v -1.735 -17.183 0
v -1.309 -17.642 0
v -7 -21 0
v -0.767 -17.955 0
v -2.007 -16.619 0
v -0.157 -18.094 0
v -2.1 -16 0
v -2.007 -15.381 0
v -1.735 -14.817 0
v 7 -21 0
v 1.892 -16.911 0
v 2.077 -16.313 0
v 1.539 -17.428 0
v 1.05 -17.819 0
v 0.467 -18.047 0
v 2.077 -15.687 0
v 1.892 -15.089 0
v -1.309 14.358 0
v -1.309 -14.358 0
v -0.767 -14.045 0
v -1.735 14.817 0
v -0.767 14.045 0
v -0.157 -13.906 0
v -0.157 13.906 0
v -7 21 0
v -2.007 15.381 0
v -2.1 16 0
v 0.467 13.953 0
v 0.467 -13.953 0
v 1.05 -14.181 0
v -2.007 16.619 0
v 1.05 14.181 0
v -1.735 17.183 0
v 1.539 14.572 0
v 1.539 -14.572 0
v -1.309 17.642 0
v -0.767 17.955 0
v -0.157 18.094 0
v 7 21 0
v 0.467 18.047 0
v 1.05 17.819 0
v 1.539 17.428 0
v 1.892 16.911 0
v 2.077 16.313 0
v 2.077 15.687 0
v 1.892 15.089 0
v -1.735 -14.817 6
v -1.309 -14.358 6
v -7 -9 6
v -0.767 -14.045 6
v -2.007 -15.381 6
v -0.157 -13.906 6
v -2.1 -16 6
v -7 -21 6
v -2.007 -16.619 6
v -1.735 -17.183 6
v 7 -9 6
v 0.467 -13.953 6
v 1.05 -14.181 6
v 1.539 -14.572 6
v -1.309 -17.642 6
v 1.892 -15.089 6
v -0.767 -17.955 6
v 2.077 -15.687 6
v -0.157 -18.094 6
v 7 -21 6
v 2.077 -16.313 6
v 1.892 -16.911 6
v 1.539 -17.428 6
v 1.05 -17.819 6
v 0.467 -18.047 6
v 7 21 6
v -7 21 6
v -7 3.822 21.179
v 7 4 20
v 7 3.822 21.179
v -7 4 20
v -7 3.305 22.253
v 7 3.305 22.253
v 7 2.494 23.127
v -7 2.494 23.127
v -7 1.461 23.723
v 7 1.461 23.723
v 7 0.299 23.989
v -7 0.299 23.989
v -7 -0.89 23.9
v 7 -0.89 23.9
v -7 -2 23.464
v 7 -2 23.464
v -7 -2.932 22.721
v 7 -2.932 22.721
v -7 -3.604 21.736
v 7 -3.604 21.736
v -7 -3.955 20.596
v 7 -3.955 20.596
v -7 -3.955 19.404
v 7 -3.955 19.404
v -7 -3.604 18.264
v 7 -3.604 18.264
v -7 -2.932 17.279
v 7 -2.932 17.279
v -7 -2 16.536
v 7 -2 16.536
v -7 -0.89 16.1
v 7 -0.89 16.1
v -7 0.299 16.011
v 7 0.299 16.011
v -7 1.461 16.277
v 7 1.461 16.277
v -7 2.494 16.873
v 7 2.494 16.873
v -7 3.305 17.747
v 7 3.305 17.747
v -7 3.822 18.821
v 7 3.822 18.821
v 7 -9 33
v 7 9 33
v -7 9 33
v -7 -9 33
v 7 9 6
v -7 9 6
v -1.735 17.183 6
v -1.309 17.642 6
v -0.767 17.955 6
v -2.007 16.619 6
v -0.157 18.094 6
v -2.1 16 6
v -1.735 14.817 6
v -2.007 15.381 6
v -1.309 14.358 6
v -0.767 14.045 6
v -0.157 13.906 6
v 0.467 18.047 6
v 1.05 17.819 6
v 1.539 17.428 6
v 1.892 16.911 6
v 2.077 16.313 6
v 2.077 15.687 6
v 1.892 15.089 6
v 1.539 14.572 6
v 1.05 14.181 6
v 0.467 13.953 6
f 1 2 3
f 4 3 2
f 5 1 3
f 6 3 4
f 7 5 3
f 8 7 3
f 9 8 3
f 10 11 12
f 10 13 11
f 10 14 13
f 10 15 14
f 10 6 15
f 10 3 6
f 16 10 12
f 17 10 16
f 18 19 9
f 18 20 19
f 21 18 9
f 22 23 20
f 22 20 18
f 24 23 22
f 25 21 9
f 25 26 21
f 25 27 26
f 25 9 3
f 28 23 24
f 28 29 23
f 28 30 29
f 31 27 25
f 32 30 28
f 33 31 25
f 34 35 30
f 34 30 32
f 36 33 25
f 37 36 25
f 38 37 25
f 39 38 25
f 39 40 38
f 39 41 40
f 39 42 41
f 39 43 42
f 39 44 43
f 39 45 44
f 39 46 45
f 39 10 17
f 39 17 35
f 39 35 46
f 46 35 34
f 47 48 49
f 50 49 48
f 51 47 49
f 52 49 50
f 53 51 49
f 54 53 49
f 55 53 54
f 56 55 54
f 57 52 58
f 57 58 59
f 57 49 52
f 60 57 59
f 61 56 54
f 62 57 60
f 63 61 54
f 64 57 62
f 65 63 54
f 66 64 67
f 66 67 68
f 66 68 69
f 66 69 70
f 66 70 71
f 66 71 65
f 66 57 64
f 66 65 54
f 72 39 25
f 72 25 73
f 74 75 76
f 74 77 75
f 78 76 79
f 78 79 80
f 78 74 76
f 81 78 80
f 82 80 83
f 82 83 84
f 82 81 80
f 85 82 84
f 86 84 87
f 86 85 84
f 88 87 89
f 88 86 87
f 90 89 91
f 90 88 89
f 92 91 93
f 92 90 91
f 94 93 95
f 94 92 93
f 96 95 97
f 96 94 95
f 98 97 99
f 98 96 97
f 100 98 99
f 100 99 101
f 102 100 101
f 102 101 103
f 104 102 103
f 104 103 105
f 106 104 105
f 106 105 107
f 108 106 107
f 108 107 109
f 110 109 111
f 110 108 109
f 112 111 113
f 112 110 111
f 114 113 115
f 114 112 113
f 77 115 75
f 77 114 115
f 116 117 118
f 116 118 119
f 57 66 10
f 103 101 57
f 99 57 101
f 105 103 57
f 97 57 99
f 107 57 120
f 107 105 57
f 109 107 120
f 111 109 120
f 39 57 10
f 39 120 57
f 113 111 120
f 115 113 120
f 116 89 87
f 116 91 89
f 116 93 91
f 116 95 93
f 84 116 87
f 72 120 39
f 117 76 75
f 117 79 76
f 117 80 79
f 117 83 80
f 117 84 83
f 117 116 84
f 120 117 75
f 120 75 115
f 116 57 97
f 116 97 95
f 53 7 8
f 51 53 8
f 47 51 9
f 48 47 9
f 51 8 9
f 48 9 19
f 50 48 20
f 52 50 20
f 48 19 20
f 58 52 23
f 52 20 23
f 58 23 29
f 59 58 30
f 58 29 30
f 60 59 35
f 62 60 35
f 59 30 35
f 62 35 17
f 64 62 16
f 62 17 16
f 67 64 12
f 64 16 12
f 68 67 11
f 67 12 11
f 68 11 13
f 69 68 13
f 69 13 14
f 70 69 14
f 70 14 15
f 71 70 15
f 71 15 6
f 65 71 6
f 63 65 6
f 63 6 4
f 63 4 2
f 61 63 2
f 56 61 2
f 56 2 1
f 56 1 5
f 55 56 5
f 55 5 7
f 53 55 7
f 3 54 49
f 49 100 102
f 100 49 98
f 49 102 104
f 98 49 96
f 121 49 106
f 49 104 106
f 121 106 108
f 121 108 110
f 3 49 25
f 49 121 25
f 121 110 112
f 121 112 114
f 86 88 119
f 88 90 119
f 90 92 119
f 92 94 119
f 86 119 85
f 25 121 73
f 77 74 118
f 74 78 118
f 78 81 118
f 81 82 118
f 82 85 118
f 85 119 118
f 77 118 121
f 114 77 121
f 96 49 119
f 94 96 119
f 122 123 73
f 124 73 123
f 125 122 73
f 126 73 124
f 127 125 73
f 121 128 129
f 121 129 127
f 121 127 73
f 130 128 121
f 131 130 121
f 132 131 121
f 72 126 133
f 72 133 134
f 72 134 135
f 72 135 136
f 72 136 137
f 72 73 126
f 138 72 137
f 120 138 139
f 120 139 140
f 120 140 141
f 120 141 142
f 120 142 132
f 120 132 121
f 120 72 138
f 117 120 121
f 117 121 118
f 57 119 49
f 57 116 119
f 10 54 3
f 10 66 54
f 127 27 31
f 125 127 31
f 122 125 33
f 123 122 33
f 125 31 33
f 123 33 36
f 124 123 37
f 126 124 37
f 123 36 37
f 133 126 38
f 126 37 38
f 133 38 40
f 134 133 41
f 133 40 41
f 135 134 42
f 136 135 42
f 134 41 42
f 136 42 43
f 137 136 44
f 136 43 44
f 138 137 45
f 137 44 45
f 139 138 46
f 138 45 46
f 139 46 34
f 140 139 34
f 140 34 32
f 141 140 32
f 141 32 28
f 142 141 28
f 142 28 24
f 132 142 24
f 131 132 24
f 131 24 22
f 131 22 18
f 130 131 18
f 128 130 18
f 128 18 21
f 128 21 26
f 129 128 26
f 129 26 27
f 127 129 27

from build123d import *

# Parameters (mm, degrees)
F0_R     = 4
F1_DEPTH = 7
F4_D     = 4.2


with BuildPart() as f1:
    # F0 (on Right) → F1 (new body, symmetric)
    with BuildSketch(Plane.YZ):
        Polygon((-21, 0), (0, 0), (21, 0), (21, 6), (9, 6), (9, 33), (0, 33), (-9, 33), (-9, 6), (-21, 6), align=None)
        with Locations((0, 20)):
            Circle(F0_R, mode=Mode.SUBTRACT)
    extrude(amount=F1_DEPTH, both=True)

    # F4 (through all)
    with Locations(Plane.XY.offset(6)):
        with Locations((0, -16), (0, 16)):
            Hole(F4_D / 2)


solid = f1.part
